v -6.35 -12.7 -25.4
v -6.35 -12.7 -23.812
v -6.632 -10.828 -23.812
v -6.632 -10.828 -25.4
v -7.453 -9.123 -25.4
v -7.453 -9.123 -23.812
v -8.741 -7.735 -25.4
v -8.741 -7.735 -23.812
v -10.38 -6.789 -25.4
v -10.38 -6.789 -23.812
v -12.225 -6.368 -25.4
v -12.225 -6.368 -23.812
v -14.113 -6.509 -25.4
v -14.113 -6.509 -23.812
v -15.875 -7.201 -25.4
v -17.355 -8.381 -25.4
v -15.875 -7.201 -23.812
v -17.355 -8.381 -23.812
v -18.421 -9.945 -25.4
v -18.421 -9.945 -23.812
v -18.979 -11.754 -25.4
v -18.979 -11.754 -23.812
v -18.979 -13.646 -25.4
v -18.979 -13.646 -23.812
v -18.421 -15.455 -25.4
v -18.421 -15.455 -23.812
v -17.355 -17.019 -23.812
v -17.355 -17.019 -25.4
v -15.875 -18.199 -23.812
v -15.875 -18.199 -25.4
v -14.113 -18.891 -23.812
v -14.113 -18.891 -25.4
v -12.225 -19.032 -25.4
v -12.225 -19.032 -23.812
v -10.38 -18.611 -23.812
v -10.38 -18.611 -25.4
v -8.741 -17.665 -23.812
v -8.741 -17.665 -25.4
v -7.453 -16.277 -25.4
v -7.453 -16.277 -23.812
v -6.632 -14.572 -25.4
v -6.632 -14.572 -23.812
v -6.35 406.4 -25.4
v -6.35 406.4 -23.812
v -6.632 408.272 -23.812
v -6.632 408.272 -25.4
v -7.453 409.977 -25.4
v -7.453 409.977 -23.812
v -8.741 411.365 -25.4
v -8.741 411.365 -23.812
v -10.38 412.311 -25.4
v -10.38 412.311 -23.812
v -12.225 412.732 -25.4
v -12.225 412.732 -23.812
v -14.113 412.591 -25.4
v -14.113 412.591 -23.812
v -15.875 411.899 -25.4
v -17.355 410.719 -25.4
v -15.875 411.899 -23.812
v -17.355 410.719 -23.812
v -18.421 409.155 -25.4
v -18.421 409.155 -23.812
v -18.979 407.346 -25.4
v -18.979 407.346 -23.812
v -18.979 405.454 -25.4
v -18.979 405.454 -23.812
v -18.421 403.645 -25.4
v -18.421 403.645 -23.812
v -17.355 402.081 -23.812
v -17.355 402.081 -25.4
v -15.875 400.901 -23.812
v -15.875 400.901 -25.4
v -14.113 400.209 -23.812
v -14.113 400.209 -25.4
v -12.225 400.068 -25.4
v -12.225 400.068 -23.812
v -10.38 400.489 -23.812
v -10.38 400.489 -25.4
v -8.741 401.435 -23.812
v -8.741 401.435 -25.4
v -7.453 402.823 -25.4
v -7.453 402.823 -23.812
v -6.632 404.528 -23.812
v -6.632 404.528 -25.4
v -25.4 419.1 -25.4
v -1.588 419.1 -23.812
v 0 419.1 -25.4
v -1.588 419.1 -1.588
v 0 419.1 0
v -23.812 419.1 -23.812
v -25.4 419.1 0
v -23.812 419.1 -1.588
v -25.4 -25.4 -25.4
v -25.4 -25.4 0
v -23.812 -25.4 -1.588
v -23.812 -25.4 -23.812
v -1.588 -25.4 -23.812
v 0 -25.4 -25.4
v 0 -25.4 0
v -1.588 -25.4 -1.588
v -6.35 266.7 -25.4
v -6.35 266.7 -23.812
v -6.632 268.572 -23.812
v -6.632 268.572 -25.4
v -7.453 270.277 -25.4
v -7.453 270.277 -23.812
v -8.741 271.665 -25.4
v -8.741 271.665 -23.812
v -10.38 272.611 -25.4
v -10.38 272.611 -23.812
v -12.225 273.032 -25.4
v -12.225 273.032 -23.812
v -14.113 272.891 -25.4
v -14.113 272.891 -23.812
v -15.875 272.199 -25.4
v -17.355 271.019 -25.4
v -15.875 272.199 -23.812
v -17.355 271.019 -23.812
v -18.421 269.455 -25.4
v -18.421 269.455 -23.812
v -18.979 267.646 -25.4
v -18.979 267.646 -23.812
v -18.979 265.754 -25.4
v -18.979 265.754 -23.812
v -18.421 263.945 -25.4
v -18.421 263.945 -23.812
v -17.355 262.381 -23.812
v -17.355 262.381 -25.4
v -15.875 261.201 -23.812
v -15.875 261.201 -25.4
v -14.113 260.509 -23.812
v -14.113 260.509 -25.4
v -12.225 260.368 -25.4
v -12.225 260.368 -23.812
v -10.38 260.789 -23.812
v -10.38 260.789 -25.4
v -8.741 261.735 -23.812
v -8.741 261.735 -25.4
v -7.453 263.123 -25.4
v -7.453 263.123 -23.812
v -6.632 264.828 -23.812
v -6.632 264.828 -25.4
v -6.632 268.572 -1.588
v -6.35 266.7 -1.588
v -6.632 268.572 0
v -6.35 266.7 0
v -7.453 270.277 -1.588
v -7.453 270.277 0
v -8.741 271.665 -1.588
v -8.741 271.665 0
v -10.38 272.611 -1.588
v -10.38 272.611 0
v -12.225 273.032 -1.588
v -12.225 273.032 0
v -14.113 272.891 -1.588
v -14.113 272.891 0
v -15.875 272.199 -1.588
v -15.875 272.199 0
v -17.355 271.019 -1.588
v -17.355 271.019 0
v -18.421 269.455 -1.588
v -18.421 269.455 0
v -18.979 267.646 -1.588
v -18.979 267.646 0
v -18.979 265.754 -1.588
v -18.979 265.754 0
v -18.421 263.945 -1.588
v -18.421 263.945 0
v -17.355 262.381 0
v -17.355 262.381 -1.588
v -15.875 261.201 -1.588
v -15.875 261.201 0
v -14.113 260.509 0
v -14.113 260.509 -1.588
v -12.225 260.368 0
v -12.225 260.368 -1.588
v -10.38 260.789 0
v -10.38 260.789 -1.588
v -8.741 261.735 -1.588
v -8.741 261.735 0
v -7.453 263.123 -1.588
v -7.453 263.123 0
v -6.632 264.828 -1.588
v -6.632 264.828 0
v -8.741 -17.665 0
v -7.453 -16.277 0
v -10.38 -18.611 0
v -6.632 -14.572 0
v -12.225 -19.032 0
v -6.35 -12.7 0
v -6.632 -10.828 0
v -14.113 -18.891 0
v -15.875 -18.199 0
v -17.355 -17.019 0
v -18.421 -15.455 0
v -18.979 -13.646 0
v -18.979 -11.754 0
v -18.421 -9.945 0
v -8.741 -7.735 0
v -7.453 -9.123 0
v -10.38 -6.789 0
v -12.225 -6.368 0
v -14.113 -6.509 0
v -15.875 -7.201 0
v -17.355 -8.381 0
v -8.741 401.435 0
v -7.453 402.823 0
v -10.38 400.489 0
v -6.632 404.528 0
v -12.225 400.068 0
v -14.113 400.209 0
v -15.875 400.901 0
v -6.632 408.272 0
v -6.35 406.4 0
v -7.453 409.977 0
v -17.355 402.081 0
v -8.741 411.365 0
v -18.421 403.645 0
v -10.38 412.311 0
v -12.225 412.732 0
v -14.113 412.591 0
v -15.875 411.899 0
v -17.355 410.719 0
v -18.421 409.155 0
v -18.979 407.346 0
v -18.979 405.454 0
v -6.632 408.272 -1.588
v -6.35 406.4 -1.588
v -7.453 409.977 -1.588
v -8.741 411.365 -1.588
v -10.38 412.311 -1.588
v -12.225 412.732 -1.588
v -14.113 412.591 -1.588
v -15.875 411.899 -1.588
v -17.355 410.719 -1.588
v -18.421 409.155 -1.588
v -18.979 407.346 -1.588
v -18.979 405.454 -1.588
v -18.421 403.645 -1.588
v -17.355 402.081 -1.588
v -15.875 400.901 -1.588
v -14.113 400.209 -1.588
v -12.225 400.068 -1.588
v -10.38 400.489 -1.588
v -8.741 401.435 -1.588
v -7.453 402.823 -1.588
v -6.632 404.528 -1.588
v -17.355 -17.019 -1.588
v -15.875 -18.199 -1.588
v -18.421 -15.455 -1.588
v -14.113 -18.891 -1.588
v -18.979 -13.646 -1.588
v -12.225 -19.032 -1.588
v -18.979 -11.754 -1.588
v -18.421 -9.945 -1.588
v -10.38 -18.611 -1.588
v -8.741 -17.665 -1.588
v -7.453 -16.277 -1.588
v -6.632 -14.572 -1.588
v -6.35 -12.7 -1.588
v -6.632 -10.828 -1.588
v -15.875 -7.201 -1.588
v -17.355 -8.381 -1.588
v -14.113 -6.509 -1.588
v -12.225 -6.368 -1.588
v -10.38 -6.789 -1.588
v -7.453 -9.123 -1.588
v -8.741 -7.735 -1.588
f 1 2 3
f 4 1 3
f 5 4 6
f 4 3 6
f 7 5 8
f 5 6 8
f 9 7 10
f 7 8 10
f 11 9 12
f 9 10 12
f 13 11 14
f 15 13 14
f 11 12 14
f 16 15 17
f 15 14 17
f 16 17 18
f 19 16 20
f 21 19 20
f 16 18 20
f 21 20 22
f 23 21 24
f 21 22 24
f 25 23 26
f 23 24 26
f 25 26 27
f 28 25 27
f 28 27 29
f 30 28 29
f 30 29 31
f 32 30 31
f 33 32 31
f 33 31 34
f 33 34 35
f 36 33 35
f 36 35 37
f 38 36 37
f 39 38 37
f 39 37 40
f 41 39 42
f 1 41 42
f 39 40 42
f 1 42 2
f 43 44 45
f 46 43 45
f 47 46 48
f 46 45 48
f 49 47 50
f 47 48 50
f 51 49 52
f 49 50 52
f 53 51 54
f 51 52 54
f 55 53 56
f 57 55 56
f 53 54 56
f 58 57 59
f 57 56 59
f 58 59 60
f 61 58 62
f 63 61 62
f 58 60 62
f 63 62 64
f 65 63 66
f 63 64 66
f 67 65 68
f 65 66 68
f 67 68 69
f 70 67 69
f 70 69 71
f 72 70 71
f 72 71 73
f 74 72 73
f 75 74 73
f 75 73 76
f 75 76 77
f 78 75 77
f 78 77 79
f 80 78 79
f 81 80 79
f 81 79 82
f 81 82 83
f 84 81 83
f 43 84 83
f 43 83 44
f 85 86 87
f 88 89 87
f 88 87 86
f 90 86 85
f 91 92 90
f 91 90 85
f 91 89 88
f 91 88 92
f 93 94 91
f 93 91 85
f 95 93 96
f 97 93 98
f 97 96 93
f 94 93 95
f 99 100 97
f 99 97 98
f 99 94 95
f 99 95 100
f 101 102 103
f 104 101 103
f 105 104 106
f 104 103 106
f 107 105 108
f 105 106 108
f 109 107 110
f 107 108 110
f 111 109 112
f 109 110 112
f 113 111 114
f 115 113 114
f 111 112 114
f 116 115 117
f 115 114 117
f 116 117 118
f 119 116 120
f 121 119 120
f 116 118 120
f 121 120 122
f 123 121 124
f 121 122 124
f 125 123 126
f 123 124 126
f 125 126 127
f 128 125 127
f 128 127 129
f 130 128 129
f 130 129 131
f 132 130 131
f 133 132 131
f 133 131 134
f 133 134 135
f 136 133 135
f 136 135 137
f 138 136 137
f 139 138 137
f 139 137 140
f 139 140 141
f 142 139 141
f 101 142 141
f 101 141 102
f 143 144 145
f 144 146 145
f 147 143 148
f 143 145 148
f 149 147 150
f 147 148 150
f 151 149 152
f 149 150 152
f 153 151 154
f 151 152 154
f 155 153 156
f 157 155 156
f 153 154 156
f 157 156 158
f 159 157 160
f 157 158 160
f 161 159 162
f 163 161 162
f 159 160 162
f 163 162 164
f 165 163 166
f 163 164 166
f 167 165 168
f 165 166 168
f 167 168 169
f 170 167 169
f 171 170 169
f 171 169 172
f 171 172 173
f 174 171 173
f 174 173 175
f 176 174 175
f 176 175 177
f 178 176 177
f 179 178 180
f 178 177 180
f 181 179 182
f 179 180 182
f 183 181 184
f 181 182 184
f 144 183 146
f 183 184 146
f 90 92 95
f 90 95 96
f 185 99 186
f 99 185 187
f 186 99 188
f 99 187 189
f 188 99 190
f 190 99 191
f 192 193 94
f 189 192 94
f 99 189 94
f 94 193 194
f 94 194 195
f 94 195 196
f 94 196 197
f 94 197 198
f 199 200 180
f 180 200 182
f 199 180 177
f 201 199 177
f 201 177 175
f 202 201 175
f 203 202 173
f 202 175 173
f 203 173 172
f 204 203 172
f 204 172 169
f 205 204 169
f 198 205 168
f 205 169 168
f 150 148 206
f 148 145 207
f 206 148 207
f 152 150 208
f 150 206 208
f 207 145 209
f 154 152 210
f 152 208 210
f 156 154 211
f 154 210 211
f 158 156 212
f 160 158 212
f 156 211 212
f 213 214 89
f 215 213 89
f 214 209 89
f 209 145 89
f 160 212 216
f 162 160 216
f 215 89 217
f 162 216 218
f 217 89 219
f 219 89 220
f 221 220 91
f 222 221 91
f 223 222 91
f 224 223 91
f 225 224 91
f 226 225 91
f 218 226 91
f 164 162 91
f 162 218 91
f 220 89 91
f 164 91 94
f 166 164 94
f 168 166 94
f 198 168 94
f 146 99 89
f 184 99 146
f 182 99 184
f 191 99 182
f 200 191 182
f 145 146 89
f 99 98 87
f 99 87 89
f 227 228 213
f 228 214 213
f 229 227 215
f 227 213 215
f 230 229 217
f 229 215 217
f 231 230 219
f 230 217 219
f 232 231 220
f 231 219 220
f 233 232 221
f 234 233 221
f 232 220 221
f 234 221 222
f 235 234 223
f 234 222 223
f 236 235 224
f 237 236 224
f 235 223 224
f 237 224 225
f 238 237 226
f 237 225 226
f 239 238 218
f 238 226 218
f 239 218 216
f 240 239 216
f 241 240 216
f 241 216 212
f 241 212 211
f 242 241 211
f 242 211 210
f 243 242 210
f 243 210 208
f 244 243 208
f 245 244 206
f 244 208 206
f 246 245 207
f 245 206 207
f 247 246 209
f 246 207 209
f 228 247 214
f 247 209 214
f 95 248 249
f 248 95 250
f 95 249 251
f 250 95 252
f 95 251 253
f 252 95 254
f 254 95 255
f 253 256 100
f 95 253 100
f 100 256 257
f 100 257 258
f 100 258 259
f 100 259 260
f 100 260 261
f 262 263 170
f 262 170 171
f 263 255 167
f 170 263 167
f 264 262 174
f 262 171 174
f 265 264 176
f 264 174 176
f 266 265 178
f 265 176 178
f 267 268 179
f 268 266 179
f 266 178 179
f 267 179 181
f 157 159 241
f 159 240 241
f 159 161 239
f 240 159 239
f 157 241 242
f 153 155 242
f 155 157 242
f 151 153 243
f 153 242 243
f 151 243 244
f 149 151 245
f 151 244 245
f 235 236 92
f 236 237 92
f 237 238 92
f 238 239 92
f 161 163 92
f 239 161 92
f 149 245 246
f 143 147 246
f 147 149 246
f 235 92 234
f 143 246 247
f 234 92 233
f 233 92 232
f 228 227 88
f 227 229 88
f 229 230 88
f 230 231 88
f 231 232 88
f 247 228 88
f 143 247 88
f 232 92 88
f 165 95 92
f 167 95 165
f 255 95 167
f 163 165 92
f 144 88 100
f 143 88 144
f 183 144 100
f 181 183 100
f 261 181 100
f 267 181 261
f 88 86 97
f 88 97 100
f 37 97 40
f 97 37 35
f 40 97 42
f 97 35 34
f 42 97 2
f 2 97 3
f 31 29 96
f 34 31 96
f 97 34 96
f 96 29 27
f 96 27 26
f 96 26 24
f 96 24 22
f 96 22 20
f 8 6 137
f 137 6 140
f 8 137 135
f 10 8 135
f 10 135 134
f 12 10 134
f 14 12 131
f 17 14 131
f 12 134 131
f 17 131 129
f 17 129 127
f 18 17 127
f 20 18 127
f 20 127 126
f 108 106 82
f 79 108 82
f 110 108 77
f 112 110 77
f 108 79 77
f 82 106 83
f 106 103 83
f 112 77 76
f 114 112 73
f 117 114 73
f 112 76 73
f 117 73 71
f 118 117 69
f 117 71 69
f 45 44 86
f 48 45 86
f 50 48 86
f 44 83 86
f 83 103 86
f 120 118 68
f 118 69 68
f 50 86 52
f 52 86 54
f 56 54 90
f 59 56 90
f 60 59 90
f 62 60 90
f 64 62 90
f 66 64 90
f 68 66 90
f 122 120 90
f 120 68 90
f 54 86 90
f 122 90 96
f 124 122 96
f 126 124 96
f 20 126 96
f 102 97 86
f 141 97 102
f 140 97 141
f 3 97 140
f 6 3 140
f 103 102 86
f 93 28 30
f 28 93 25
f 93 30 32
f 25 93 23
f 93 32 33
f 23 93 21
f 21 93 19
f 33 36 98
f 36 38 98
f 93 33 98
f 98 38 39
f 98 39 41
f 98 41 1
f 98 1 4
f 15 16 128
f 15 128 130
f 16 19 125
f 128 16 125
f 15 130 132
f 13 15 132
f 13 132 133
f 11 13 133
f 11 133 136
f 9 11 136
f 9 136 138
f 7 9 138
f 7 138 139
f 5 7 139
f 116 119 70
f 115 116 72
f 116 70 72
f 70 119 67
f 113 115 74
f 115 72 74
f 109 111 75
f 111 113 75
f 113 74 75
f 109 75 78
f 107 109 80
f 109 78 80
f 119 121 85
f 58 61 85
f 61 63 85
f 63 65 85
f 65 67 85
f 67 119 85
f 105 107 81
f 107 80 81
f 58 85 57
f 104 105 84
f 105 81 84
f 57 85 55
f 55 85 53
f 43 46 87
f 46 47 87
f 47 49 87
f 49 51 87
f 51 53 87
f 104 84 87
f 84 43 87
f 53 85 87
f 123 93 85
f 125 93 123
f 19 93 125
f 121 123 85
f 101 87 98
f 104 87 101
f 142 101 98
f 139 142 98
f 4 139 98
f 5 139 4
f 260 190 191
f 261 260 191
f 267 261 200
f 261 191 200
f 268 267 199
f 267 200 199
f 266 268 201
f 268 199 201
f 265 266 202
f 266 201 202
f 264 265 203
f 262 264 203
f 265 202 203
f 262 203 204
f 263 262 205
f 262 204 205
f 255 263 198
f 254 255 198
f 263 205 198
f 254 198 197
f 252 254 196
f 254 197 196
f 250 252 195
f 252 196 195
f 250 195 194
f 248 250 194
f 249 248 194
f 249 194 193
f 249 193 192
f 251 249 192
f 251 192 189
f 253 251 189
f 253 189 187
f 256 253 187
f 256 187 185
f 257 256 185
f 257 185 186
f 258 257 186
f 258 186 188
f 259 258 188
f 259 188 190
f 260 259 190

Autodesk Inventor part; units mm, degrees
ref_plane "YZ Plane" through (0, 0, 0) normal (1, 0, 0) x (0, 1, 0)
ref_plane "XZ Plane" through (0, 0, 0) normal (0, 1, 0) x (-1, 0, 0)
ref_plane "XY Plane" through (0, 0, 0) normal (0, 0, 1) x (1, 0, 0)
sketch "Sketch1" plane through (0, 0, 0) normal (0, 1, 0) x (-1, 0, 0)
  line L0 (0, 0) -> (25.4, 0)
  line L1 (25.4, 0) -> (25.4, -25.4)
  line L2 (25.4, -25.4) -> (0, -25.4)
  line L3 (0, -25.4) -> (0, 0)
  line L4 (23.8125, -23.8125) -> (23.8125, -1.5875)
  line L5 (23.8125, -1.5875) -> (1.5875, -1.5875)
  line L6 (1.5875, -1.5875) -> (1.5875, -23.8125)
  line L7 (1.5875, -23.8125) -> (23.8125, -23.8125)
  dimension "d0" = 25.4
  dimension "d1" = 25.4
  dimension "d2" = 1.5875
extrude "Extrusion1" add sketch "Sketch1" along normal blind 419.1
sketch "Sketch3" plane through (-25.4, 0, 0) normal (0, 0, 1) x (1, 0, 0)
  point P0 (25.4, 0)
sketch "Sketch4" plane through (-25.4, 0, 0) normal (0, 0, 1) x (1, 0, 0)
  circle A0 centre (12.7, 406.4) radius 6.35
  line L0 (25.4, 0) -> (0, 0) projected
  line L1 (25.4, 0) -> (25.4, 419.1) projected
  line L2 (1.5875, 419.1) -> (23.8125, 419.1) projected
  dimension "d8" = 12.7
  dimension "d28" = 12.7
  dimension "d29" = 12.7
extrude "Extrusion3" cut sketch "Sketch4" against normal blind 25.4
sketch "Sketch5" plane through (-25.4, 0, 0) normal (0, 0, 1) x (1, 0, 0)
  circle A0 centre (12.7, 266.7) radius 6.35
  line L0 (25.4, 0) -> (0, 0) projected
  dimension "d12" = 12.7
  dimension "d15" = 266.7
extrude "Extrusion4" cut sketch "Sketch5" against normal blind 25.4
sketch "Sketch7" plane through (0, 0, 0) normal (0, -1, 0) x (1, 0, 0)
  line L0 (0, 0) -> (-25.4, 0)
  line L1 (-25.4, 0) -> (-25.4, -25.4)
  line L2 (-25.4, -25.4) -> (0, -25.4)
  line L3 (0, -25.4) -> (0, 0)
  line L4 (-1.5875, -23.8125) -> (-23.8125, -23.8125) projected
  line L5 (-23.8125, -1.5875) -> (-1.5875, -1.5875) projected
  line L6 (-23.8125, -23.8125) -> (-1.5875, -23.8125)
  line L7 (-1.5875, -23.8125) -> (-1.5875, -1.5875)
  line L8 (-1.5875, -1.5875) -> (-23.8125, -1.5875)
  line L9 (-23.8125, -1.5875) -> (-23.8125, -23.8125)
extrude "Extrusion6" add sketch "Sketch7" along normal blind 25.4
sketch "Sketch8" plane through (-25.4, 419.1, 0) normal (0, 0, 1) x (1, 0, 0)
  circle A0 centre (12.7, -431.8) radius 6.35
  line L0 (25.4, -444.5) -> (25.4, 0) projected
  line L1 (25.4, -444.5) -> (0, -444.5) projected
  point P0 (25.4, -419.1)
  dimension "d23" = 12.7
  dimension "d24" = 12.7
  dimension "d27" = 12.7
extrude "Extrusion7" cut sketch "Sketch8" against normal blind 25.4
properties part number "AP 2"
